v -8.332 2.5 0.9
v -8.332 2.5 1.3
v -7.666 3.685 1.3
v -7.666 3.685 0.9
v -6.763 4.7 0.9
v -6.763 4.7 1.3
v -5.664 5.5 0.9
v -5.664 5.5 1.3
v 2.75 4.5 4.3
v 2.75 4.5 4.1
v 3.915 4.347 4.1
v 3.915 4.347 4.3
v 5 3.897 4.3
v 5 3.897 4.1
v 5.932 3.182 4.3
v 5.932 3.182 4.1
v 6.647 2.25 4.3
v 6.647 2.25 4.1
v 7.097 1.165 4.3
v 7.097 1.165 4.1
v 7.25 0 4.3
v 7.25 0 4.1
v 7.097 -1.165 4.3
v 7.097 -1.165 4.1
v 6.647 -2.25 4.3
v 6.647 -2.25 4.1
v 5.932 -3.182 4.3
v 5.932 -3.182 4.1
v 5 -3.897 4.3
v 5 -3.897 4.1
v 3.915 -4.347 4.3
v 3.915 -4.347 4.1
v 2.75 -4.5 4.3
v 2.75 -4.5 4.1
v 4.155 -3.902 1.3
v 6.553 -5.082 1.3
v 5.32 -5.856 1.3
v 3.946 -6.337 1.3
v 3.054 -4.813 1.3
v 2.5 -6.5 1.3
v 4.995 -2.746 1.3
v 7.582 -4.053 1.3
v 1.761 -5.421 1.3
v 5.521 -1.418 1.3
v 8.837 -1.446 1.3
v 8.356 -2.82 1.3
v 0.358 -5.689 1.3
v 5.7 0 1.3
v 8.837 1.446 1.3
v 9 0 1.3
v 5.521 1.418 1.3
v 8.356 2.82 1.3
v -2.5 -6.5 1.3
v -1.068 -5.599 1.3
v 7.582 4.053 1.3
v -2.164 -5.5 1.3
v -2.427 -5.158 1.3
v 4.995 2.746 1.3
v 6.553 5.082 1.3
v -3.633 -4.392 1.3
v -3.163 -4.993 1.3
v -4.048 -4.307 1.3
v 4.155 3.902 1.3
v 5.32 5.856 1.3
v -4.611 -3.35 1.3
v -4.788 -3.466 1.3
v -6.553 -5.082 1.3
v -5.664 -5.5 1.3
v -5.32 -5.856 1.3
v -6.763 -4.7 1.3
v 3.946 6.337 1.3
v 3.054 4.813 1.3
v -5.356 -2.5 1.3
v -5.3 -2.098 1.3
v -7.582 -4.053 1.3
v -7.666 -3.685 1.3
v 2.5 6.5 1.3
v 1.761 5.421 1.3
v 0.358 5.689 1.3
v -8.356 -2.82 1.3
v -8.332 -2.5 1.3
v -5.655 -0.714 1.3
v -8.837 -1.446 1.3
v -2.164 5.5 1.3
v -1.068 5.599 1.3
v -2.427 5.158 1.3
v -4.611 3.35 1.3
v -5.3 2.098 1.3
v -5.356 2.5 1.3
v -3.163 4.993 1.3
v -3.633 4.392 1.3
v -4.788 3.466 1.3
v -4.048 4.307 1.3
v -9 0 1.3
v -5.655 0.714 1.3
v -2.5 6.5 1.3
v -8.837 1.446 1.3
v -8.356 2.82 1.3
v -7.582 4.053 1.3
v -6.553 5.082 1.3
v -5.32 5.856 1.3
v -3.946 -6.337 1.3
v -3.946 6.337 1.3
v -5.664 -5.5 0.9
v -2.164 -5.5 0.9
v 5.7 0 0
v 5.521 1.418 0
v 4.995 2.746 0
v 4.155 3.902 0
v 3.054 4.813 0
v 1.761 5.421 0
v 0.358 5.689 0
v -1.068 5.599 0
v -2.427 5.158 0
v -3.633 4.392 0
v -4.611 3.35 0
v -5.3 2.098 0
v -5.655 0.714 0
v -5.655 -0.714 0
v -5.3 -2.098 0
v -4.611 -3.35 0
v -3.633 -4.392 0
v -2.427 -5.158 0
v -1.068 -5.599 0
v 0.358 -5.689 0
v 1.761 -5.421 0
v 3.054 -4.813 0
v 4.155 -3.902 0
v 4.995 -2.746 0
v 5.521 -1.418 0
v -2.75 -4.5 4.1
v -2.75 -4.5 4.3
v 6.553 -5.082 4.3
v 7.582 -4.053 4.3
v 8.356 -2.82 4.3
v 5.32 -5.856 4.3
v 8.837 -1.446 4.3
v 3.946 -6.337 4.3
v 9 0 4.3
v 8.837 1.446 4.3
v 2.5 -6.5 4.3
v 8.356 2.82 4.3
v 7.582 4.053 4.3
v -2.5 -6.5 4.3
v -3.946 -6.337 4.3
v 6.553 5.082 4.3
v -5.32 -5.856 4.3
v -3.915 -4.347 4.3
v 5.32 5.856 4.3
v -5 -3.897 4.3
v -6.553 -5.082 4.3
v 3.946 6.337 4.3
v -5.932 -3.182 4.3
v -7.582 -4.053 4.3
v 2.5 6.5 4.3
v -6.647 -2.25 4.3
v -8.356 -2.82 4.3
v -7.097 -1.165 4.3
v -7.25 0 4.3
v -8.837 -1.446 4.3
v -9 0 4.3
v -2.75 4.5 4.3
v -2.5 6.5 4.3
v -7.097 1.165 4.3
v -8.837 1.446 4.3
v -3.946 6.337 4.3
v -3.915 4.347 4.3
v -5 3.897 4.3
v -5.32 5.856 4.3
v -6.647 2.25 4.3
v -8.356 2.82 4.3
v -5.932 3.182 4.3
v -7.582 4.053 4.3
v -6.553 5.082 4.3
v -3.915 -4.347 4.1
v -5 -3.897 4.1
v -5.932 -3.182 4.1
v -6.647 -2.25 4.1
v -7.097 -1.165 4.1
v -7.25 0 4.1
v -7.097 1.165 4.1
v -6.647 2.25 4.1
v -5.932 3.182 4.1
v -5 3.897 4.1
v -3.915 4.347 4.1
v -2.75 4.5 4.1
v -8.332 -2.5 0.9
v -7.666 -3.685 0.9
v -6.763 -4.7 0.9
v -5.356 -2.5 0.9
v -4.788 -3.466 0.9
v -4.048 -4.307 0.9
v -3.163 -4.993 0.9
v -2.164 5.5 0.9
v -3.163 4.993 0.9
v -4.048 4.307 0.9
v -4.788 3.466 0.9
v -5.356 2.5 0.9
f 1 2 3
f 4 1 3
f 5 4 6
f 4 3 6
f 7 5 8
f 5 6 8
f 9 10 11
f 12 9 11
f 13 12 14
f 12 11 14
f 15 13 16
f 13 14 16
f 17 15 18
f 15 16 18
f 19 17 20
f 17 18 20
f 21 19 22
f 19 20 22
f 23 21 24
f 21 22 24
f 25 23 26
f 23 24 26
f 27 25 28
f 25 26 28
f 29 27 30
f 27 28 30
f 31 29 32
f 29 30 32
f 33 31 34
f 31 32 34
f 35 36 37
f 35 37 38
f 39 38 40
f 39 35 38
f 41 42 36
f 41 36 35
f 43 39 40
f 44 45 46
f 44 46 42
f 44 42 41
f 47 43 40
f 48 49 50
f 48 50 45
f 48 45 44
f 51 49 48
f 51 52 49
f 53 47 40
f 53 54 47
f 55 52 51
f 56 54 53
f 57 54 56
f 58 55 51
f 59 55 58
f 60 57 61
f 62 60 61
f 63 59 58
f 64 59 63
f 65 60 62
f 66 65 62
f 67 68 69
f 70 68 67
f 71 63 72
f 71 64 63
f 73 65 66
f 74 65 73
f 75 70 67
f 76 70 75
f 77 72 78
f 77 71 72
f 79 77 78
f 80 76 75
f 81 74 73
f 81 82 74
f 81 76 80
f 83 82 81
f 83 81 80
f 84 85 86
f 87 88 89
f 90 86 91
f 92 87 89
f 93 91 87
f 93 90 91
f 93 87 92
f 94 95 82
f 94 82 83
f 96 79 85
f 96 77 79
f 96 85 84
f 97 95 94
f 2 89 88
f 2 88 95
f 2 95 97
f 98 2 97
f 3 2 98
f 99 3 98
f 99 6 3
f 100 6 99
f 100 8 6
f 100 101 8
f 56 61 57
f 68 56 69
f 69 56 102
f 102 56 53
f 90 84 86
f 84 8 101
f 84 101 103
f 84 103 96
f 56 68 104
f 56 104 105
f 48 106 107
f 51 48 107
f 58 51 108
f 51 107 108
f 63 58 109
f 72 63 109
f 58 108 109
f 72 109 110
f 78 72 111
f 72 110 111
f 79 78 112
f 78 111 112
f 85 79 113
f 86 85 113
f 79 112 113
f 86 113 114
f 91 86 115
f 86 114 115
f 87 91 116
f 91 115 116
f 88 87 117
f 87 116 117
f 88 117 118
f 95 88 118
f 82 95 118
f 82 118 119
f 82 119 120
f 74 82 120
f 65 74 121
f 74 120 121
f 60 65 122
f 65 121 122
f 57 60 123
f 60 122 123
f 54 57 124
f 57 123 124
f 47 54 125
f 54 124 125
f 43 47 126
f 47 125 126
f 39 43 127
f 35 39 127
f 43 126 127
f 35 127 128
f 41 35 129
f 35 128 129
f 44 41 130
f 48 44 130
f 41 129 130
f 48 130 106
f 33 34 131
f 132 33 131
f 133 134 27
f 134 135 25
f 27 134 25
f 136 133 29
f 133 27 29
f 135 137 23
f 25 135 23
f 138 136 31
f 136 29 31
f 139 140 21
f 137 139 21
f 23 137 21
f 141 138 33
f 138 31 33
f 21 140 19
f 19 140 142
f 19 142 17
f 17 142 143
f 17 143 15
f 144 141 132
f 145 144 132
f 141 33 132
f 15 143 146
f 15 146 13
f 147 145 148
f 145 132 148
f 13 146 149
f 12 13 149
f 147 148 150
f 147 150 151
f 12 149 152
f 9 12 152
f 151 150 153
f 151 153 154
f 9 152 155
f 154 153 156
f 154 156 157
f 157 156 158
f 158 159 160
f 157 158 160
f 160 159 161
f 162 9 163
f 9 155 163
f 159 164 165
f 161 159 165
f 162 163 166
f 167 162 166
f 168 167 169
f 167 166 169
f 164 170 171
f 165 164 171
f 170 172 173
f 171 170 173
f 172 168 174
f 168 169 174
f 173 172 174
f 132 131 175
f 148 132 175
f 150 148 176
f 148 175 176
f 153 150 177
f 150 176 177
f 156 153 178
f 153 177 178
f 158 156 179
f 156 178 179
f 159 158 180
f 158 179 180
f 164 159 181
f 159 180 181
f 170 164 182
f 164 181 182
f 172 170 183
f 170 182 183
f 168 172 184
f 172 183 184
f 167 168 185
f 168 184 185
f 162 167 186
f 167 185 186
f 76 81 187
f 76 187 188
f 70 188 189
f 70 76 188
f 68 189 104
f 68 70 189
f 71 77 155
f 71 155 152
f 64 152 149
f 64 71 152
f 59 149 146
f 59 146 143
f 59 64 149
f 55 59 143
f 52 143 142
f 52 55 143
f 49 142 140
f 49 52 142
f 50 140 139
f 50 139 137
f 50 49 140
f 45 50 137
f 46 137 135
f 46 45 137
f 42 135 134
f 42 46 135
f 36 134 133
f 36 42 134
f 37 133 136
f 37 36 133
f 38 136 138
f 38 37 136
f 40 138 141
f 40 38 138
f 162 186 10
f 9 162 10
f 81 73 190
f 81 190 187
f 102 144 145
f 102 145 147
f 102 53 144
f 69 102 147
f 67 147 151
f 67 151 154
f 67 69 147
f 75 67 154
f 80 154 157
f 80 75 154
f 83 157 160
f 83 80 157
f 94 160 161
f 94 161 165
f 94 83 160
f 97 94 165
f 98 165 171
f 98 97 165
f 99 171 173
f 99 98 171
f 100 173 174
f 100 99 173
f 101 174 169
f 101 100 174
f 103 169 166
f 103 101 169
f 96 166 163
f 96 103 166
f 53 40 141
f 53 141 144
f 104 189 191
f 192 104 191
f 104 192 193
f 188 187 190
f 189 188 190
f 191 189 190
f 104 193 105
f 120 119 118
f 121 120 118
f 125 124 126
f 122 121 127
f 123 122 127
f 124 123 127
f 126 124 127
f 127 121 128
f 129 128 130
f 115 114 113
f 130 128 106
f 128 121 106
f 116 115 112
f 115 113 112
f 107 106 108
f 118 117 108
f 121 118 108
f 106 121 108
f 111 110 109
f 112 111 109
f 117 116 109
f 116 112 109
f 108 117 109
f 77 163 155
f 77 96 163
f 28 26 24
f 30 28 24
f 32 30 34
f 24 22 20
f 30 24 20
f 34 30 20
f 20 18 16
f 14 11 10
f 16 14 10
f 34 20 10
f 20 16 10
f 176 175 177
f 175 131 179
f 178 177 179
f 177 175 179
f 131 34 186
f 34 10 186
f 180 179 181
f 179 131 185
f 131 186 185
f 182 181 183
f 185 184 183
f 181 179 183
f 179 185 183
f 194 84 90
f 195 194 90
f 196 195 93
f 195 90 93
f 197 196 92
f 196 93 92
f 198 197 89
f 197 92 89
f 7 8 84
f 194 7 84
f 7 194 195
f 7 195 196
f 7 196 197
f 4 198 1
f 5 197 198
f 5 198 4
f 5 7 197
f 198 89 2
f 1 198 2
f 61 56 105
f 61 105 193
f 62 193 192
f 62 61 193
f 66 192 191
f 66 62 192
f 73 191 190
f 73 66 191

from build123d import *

# Parameters (mm, degrees)
SKETCH_1_R      = 5.7
EXTRUDE_1_DEPTH = 1.3
EXTRUDE_2_DEPTH = 2.8
EXTRUDE_3_DEPTH = 0.2
EXTRUDE_4_DEPTH = 0.4


with BuildPart() as part:
    # Эскиз1 → Бобышка-Вытянуть1 (new body)
    with BuildSketch(Plane.XY):
        Circle(SKETCH_1_R)
    extrude(amount=EXTRUDE_1_DEPTH)

    # Эскиз2 → Бобышка-Вытянуть2 (add)
    with BuildSketch(Plane.XY.offset(1.3)):
        with BuildLine():
            Line((-2.5, 6.5), (2.5, 6.5))
            ThreePointArc((2.5, 6.5), (9, 0), (2.5, -6.5))
            Line((2.5, -6.5), (-2.5, -6.5))
            ThreePointArc((-2.5, -6.5), (-9, 0), (-2.5, 6.5))
        make_face()
    extrude(amount=EXTRUDE_2_DEPTH)

    # Эскиз3 → Бобышка-Вытянуть3 (add)
    with BuildSketch(Plane.XY.offset(4.1)):
        with BuildLine():
            Line((-2.5, 6.5), (2.5, 6.5))
            ThreePointArc((2.5, 6.5), (9, 0), (2.5, -6.5))
            Line((2.5, -6.5), (-2.5, -6.5))
            ThreePointArc((-2.5, -6.5), (-9, 0), (-2.5, 6.5))
        make_face()
        with BuildLine():
            Line((-2.75, 4.5), (2.75, 4.5))
            ThreePointArc((2.75, 4.5), (7.25, 0), (2.75, -4.5))
            Line((2.75, -4.5), (-2.75, -4.5))
            ThreePointArc((-2.75, -4.5), (-7.25, 0), (-2.75, 4.5))
        make_face(mode=Mode.SUBTRACT)
    extrude(amount=EXTRUDE_3_DEPTH)

    # Эскиз4 → Бобышка-Вытянуть4 (add)
    with BuildSketch(Plane(origin=(0, 0, 1.3), x_dir=(-1, 0, 0), z_dir=(0, 0, -1))):
        with BuildLine():
            Line((5.355682571, 2.5), (8.331941275, 2.5))
            ThreePointArc((8.331941275, 2.5), (7.241539509, 4.216555717), (5.664101615, 5.5))
            Line((5.664101615, 5.5), (2.164101615, 5.5))
            ThreePointArc((2.164101615, 5.5), (4.04805985, 4.306570242), (5.355682571, 2.5))
        make_face()
        with BuildLine():
            Line((5.355682571, -2.5), (8.331941275, -2.5))
            ThreePointArc((8.331941275, -2.5), (7.241539509, -4.216555717), (5.664101615, -5.5))
            Line((5.664101615, -5.5), (2.164101615, -5.5))
            ThreePointArc((2.164101615, -5.5), (4.04805985, -4.306570242), (5.355682571, -2.5))
        make_face()
    extrude(amount=EXTRUDE_4_DEPTH)


solid = part.part
